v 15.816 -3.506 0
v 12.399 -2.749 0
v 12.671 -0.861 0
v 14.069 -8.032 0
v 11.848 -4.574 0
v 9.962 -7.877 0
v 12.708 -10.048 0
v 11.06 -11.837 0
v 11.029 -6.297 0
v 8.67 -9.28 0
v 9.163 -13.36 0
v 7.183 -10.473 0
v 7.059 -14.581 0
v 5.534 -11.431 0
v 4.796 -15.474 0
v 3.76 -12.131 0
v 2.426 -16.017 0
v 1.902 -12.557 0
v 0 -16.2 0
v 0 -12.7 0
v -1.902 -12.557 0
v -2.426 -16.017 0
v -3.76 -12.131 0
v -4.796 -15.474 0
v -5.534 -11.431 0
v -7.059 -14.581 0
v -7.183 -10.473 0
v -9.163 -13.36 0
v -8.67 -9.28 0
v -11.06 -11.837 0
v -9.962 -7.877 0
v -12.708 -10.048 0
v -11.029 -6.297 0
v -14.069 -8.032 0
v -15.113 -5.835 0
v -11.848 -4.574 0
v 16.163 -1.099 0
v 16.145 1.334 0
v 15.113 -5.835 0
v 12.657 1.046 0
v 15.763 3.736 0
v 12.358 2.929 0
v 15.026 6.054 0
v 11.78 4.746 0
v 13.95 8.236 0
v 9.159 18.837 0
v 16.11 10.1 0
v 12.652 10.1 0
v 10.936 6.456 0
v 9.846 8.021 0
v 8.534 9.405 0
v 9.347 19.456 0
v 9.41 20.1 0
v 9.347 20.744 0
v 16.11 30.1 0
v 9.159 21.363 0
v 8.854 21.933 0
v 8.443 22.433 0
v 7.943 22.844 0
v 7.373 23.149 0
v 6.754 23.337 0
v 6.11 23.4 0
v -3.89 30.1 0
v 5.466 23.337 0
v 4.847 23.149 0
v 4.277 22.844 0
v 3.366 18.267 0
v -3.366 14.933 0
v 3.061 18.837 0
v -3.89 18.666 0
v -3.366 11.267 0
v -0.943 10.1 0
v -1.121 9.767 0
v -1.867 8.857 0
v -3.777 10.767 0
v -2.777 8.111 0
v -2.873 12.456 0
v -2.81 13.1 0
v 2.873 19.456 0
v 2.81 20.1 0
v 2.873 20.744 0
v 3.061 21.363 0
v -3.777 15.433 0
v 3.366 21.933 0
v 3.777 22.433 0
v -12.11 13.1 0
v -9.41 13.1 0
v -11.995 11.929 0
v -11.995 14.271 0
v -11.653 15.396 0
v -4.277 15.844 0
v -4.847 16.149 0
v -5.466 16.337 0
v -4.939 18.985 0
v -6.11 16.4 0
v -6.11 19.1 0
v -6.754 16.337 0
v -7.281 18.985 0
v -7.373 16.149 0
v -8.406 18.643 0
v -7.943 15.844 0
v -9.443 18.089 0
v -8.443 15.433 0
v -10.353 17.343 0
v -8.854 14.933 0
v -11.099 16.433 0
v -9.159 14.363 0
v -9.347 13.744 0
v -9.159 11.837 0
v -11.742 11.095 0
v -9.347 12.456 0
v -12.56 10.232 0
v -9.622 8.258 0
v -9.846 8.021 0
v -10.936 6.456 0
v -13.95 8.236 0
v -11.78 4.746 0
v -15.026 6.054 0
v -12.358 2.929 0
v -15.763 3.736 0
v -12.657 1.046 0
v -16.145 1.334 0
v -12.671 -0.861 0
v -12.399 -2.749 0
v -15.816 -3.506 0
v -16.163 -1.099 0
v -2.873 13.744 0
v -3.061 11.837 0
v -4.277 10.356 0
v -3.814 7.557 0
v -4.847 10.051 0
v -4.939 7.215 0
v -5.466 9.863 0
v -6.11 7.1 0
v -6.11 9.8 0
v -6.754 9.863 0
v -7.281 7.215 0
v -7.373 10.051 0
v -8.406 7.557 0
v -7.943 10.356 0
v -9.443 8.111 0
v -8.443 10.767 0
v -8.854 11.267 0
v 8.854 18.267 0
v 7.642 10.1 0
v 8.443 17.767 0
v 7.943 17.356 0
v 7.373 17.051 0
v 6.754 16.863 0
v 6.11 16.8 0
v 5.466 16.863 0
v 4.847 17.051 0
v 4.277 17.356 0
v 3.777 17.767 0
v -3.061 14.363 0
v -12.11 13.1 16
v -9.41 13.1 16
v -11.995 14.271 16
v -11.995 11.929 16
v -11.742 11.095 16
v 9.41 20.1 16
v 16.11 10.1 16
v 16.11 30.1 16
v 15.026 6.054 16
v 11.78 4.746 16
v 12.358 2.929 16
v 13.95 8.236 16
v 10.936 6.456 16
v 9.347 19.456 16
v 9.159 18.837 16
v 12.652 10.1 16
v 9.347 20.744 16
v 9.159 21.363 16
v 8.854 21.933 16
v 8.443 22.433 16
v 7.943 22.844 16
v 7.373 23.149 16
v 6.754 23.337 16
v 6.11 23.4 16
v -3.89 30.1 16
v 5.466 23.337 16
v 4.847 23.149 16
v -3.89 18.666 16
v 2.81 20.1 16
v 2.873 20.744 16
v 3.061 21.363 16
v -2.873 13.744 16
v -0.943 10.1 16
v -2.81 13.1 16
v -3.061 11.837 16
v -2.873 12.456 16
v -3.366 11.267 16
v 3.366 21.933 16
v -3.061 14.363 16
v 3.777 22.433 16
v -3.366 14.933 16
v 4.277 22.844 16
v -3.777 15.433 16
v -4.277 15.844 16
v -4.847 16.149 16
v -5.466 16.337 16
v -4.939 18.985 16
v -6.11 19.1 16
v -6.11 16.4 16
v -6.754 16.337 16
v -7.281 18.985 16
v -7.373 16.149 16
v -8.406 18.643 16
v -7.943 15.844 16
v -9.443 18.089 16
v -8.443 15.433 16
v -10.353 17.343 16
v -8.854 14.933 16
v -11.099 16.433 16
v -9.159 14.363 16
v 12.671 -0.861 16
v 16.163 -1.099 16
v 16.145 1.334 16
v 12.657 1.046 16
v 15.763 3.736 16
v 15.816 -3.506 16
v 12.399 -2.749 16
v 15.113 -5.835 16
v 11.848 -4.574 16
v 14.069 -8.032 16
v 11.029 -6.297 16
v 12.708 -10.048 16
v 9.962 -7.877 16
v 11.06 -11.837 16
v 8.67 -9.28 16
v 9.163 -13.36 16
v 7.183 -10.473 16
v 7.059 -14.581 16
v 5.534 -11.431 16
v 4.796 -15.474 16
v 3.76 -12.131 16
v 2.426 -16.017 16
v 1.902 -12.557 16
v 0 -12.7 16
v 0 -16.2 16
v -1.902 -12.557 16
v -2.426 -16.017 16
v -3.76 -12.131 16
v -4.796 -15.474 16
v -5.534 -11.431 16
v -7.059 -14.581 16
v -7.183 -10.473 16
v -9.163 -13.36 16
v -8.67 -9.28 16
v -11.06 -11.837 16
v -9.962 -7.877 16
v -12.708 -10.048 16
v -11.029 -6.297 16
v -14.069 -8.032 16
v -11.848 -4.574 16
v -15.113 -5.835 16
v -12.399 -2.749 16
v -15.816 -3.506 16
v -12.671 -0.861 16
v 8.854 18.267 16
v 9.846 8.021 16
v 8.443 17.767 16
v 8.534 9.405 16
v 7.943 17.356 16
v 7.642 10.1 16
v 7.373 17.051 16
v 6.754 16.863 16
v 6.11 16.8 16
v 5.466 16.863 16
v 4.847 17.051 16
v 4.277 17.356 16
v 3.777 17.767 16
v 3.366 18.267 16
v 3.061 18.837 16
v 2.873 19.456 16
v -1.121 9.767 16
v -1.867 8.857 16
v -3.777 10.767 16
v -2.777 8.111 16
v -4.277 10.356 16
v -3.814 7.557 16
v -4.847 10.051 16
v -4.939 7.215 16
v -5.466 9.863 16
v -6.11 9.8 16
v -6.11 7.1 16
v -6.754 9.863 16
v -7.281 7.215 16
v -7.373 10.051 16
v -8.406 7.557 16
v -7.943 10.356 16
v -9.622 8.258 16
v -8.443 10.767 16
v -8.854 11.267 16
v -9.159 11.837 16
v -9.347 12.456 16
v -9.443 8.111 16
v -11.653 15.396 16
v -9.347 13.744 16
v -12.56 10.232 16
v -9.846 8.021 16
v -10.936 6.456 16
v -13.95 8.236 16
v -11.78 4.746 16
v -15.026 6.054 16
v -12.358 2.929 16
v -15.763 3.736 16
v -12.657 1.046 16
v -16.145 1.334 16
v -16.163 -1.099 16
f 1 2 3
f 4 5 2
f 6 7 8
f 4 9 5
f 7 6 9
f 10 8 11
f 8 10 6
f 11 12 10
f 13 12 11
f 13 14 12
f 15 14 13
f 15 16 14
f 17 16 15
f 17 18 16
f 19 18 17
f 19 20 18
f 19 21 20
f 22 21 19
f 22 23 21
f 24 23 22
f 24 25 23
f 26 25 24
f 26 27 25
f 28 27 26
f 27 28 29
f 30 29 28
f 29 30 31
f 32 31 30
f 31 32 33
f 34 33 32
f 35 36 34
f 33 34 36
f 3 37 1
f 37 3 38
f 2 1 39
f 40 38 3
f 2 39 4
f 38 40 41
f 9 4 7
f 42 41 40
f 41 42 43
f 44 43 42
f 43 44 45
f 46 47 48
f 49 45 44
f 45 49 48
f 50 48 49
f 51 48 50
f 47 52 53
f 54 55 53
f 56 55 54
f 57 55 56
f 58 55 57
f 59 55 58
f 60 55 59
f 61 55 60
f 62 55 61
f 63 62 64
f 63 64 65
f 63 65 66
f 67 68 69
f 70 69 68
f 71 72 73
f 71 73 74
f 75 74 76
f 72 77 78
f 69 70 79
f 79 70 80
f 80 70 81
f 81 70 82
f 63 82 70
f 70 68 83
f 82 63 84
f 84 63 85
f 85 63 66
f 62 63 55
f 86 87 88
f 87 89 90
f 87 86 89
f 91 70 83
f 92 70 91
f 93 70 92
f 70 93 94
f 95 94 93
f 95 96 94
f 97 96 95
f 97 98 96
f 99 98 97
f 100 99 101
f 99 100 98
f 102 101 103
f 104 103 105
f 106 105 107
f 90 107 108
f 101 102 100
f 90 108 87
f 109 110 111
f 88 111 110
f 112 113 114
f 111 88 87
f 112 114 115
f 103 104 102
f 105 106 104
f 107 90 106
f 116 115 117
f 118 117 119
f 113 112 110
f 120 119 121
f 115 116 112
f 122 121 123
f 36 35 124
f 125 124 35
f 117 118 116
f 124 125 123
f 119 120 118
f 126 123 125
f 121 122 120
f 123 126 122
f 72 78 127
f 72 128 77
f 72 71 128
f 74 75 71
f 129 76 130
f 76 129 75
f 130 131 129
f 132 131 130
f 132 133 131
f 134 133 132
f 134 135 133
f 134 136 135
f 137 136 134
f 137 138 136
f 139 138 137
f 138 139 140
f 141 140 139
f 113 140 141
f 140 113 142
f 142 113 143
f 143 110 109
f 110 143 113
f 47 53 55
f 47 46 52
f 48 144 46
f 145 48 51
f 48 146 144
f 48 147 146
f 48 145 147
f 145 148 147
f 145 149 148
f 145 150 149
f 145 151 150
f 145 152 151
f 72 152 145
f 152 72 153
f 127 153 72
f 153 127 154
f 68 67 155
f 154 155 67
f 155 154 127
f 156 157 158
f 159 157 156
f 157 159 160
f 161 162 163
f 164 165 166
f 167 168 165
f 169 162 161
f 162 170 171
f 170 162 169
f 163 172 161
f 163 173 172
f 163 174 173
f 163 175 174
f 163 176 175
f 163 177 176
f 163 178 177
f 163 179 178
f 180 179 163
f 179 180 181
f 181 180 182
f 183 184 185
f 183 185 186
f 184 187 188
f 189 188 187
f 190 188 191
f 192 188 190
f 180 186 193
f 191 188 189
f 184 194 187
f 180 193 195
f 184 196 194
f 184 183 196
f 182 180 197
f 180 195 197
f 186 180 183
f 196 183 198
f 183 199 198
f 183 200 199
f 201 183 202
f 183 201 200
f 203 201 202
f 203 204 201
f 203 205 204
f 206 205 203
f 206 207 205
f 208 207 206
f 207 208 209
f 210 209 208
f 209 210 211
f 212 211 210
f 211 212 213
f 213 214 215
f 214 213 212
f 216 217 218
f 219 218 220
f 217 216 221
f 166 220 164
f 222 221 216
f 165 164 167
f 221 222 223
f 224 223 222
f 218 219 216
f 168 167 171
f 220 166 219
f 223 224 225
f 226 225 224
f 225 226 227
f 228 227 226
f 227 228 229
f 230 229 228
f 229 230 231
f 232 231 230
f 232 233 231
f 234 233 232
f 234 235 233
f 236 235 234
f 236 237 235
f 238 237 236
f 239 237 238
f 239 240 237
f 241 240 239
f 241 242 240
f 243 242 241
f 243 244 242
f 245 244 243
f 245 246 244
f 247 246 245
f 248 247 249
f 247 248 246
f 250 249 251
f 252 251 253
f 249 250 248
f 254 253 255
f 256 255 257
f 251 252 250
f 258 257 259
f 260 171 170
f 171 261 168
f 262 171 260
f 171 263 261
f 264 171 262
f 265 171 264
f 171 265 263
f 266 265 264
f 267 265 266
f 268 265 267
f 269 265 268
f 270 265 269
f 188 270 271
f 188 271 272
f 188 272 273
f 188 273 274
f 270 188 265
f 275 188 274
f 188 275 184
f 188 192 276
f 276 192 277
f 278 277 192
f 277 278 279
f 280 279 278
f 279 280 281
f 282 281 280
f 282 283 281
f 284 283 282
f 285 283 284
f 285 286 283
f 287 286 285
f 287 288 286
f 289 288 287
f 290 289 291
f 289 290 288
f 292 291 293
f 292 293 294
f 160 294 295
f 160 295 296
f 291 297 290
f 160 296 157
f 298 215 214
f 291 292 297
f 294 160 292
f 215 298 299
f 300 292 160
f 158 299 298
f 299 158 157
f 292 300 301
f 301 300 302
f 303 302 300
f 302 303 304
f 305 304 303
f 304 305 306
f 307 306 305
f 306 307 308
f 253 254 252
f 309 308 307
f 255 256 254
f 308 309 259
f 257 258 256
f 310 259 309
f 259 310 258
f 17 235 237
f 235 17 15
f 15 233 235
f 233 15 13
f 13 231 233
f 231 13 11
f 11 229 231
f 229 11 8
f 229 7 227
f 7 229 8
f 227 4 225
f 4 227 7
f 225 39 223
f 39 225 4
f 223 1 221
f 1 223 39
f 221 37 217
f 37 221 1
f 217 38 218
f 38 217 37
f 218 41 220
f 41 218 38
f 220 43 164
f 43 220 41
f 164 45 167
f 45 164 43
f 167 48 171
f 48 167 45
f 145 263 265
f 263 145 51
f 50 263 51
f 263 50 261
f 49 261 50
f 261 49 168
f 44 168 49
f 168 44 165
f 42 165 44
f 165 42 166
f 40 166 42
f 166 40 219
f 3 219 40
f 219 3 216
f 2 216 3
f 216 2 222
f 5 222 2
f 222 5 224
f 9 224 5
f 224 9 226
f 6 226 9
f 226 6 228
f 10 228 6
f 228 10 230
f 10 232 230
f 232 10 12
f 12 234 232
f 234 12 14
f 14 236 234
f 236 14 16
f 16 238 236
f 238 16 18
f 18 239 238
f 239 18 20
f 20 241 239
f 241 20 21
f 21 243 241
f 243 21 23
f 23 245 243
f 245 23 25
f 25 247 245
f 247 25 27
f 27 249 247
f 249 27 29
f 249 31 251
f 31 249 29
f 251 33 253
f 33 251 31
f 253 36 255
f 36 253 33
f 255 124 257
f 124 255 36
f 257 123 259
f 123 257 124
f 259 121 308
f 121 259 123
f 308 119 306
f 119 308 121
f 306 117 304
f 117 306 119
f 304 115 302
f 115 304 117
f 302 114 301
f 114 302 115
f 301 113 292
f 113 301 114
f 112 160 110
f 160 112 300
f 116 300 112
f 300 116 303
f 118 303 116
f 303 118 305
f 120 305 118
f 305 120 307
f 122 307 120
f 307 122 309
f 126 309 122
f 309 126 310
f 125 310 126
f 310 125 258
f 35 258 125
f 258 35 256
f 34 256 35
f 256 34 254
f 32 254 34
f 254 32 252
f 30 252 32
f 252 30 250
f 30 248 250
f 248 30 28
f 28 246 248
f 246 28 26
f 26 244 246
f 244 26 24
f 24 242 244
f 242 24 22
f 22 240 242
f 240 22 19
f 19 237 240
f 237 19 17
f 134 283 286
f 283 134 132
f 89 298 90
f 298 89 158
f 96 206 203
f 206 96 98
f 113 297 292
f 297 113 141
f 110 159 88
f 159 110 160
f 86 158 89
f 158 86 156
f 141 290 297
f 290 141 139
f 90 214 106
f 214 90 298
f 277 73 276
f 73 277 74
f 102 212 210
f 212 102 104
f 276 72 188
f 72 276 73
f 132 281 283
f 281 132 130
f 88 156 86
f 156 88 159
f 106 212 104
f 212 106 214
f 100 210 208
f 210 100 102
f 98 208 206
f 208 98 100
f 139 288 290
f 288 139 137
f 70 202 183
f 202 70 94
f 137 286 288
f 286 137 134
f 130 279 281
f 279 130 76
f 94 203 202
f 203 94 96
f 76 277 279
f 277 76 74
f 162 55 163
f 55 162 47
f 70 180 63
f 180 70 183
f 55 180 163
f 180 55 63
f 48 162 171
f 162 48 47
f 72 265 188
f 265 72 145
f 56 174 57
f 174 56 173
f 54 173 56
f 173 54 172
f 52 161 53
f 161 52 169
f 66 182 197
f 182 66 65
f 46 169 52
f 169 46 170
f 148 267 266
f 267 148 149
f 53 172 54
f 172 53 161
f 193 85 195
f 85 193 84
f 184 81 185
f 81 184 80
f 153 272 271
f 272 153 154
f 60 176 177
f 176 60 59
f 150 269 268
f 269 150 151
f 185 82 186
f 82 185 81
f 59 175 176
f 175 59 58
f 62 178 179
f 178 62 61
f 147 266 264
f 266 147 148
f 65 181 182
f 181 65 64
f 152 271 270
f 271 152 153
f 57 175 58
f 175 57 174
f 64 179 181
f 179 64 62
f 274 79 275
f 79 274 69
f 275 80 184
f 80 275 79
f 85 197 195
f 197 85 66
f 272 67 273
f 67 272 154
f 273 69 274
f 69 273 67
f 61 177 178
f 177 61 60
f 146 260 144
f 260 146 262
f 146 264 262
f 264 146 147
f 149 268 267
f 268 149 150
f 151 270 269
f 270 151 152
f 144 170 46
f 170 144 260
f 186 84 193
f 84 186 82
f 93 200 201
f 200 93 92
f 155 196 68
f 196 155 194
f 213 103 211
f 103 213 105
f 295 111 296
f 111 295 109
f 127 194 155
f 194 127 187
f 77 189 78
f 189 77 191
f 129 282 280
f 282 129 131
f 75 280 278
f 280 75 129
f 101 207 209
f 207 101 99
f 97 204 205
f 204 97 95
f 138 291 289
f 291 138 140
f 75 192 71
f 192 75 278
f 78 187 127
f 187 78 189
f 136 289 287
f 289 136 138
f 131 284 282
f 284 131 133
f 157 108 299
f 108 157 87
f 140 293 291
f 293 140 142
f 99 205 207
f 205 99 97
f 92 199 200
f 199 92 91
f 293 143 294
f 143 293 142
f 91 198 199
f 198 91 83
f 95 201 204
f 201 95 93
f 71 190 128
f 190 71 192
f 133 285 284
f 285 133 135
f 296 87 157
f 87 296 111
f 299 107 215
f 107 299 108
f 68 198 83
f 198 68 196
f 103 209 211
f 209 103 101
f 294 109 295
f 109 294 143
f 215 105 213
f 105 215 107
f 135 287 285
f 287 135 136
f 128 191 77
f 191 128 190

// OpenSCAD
$fn = 32;

// ----------------------------------------------------------------------
// Pipe clamp: 32.4 mm ring, 3.5 mm wall, 16 mm wide
// ----------------------------------------------------------------------

// --- parameters (mm) ---
outer_r = 16.2;           // clamp outside radius
inner_r = 12.7;           // pipe bore radius
band = 3.5;               // band thickness
clamp_w = 16;             // clamp width
opening = 50;             // opening angle between the ends
lug_w = 20;               // lug width
lug_len = 20;             // lug length
bolt_d = 6.6;             // bolt hole
knuckle_d = 12;           // hinge knuckle diameter
pin_d = 6.6;              // hinge pin hole

clamp_profile = [[-6.846, 14.682], [-8.968, 13.492], [-10.887, 11.997], [-12.56, 10.232], [-13.95, 8.236], [-15.026, 6.054], [-15.763, 3.736], [-16.145, 1.334], [-16.163, -1.099], [-15.816, -3.506], [-15.113, -5.835], [-14.069, -8.032], [-12.708, -10.048], [-11.06, -11.837], [-9.163, -13.36], [-7.059, -14.581], [-4.796, -15.474], [-2.426, -16.017], [0, -16.2], [2.426, -16.017], [4.796, -15.474], [7.059, -14.581], [9.163, -13.36], [11.06, -11.837], [12.708, -10.048], [14.069, -8.032], [15.113, -5.835], [15.816, -3.506], [16.163, -1.099], [16.145, 1.334], [15.763, 3.736], [15.026, 6.054], [13.95, 8.236], [12.56, 10.232], [10.887, 11.997], [8.968, 13.492], [6.846, 14.682], [5.367, 11.51], [7.03, 10.577], [8.534, 9.405], [9.846, 8.021], [10.936, 6.456], [11.78, 4.746], [12.358, 2.929], [12.657, 1.046], [12.671, -0.861], [12.399, -2.749], [11.848, -4.574], [11.029, -6.297], [9.962, -7.877], [8.67, -9.28], [7.183, -10.473], [5.534, -11.431], [3.76, -12.131], [1.902, -12.557], [0, -12.7], [-1.902, -12.557], [-3.76, -12.131], [-5.534, -11.431], [-7.183, -10.473], [-8.67, -9.28], [-9.962, -7.877], [-11.029, -6.297], [-11.848, -4.574], [-12.399, -2.749], [-12.671, -0.861], [-12.657, 1.046], [-12.358, 2.929], [-11.78, 4.746], [-10.936, 6.456], [-9.846, 8.021], [-8.534, 9.405], [-7.03, 10.577], [-5.367, 11.51]];

difference() {
  union() {
    linear_extrude(height = clamp_w) polygon(clamp_profile);
    /* hinge knuckle, sunk 2 mm into the band end */
    translate([-6.11, 13.1, 0]) cylinder(h = clamp_w, d = knuckle_d);
    /* bolt lug on the other end */
    translate([-3.89, 10.1, 0]) cube([lug_w, 20, clamp_w]);
  }
  translate([6.11, 20.1, -2.5]) cylinder(h = clamp_w + 5, d = bolt_d);
  translate([-6.11, 13.1, -2.5]) cylinder(h = clamp_w + 5, d = pin_d);
}
